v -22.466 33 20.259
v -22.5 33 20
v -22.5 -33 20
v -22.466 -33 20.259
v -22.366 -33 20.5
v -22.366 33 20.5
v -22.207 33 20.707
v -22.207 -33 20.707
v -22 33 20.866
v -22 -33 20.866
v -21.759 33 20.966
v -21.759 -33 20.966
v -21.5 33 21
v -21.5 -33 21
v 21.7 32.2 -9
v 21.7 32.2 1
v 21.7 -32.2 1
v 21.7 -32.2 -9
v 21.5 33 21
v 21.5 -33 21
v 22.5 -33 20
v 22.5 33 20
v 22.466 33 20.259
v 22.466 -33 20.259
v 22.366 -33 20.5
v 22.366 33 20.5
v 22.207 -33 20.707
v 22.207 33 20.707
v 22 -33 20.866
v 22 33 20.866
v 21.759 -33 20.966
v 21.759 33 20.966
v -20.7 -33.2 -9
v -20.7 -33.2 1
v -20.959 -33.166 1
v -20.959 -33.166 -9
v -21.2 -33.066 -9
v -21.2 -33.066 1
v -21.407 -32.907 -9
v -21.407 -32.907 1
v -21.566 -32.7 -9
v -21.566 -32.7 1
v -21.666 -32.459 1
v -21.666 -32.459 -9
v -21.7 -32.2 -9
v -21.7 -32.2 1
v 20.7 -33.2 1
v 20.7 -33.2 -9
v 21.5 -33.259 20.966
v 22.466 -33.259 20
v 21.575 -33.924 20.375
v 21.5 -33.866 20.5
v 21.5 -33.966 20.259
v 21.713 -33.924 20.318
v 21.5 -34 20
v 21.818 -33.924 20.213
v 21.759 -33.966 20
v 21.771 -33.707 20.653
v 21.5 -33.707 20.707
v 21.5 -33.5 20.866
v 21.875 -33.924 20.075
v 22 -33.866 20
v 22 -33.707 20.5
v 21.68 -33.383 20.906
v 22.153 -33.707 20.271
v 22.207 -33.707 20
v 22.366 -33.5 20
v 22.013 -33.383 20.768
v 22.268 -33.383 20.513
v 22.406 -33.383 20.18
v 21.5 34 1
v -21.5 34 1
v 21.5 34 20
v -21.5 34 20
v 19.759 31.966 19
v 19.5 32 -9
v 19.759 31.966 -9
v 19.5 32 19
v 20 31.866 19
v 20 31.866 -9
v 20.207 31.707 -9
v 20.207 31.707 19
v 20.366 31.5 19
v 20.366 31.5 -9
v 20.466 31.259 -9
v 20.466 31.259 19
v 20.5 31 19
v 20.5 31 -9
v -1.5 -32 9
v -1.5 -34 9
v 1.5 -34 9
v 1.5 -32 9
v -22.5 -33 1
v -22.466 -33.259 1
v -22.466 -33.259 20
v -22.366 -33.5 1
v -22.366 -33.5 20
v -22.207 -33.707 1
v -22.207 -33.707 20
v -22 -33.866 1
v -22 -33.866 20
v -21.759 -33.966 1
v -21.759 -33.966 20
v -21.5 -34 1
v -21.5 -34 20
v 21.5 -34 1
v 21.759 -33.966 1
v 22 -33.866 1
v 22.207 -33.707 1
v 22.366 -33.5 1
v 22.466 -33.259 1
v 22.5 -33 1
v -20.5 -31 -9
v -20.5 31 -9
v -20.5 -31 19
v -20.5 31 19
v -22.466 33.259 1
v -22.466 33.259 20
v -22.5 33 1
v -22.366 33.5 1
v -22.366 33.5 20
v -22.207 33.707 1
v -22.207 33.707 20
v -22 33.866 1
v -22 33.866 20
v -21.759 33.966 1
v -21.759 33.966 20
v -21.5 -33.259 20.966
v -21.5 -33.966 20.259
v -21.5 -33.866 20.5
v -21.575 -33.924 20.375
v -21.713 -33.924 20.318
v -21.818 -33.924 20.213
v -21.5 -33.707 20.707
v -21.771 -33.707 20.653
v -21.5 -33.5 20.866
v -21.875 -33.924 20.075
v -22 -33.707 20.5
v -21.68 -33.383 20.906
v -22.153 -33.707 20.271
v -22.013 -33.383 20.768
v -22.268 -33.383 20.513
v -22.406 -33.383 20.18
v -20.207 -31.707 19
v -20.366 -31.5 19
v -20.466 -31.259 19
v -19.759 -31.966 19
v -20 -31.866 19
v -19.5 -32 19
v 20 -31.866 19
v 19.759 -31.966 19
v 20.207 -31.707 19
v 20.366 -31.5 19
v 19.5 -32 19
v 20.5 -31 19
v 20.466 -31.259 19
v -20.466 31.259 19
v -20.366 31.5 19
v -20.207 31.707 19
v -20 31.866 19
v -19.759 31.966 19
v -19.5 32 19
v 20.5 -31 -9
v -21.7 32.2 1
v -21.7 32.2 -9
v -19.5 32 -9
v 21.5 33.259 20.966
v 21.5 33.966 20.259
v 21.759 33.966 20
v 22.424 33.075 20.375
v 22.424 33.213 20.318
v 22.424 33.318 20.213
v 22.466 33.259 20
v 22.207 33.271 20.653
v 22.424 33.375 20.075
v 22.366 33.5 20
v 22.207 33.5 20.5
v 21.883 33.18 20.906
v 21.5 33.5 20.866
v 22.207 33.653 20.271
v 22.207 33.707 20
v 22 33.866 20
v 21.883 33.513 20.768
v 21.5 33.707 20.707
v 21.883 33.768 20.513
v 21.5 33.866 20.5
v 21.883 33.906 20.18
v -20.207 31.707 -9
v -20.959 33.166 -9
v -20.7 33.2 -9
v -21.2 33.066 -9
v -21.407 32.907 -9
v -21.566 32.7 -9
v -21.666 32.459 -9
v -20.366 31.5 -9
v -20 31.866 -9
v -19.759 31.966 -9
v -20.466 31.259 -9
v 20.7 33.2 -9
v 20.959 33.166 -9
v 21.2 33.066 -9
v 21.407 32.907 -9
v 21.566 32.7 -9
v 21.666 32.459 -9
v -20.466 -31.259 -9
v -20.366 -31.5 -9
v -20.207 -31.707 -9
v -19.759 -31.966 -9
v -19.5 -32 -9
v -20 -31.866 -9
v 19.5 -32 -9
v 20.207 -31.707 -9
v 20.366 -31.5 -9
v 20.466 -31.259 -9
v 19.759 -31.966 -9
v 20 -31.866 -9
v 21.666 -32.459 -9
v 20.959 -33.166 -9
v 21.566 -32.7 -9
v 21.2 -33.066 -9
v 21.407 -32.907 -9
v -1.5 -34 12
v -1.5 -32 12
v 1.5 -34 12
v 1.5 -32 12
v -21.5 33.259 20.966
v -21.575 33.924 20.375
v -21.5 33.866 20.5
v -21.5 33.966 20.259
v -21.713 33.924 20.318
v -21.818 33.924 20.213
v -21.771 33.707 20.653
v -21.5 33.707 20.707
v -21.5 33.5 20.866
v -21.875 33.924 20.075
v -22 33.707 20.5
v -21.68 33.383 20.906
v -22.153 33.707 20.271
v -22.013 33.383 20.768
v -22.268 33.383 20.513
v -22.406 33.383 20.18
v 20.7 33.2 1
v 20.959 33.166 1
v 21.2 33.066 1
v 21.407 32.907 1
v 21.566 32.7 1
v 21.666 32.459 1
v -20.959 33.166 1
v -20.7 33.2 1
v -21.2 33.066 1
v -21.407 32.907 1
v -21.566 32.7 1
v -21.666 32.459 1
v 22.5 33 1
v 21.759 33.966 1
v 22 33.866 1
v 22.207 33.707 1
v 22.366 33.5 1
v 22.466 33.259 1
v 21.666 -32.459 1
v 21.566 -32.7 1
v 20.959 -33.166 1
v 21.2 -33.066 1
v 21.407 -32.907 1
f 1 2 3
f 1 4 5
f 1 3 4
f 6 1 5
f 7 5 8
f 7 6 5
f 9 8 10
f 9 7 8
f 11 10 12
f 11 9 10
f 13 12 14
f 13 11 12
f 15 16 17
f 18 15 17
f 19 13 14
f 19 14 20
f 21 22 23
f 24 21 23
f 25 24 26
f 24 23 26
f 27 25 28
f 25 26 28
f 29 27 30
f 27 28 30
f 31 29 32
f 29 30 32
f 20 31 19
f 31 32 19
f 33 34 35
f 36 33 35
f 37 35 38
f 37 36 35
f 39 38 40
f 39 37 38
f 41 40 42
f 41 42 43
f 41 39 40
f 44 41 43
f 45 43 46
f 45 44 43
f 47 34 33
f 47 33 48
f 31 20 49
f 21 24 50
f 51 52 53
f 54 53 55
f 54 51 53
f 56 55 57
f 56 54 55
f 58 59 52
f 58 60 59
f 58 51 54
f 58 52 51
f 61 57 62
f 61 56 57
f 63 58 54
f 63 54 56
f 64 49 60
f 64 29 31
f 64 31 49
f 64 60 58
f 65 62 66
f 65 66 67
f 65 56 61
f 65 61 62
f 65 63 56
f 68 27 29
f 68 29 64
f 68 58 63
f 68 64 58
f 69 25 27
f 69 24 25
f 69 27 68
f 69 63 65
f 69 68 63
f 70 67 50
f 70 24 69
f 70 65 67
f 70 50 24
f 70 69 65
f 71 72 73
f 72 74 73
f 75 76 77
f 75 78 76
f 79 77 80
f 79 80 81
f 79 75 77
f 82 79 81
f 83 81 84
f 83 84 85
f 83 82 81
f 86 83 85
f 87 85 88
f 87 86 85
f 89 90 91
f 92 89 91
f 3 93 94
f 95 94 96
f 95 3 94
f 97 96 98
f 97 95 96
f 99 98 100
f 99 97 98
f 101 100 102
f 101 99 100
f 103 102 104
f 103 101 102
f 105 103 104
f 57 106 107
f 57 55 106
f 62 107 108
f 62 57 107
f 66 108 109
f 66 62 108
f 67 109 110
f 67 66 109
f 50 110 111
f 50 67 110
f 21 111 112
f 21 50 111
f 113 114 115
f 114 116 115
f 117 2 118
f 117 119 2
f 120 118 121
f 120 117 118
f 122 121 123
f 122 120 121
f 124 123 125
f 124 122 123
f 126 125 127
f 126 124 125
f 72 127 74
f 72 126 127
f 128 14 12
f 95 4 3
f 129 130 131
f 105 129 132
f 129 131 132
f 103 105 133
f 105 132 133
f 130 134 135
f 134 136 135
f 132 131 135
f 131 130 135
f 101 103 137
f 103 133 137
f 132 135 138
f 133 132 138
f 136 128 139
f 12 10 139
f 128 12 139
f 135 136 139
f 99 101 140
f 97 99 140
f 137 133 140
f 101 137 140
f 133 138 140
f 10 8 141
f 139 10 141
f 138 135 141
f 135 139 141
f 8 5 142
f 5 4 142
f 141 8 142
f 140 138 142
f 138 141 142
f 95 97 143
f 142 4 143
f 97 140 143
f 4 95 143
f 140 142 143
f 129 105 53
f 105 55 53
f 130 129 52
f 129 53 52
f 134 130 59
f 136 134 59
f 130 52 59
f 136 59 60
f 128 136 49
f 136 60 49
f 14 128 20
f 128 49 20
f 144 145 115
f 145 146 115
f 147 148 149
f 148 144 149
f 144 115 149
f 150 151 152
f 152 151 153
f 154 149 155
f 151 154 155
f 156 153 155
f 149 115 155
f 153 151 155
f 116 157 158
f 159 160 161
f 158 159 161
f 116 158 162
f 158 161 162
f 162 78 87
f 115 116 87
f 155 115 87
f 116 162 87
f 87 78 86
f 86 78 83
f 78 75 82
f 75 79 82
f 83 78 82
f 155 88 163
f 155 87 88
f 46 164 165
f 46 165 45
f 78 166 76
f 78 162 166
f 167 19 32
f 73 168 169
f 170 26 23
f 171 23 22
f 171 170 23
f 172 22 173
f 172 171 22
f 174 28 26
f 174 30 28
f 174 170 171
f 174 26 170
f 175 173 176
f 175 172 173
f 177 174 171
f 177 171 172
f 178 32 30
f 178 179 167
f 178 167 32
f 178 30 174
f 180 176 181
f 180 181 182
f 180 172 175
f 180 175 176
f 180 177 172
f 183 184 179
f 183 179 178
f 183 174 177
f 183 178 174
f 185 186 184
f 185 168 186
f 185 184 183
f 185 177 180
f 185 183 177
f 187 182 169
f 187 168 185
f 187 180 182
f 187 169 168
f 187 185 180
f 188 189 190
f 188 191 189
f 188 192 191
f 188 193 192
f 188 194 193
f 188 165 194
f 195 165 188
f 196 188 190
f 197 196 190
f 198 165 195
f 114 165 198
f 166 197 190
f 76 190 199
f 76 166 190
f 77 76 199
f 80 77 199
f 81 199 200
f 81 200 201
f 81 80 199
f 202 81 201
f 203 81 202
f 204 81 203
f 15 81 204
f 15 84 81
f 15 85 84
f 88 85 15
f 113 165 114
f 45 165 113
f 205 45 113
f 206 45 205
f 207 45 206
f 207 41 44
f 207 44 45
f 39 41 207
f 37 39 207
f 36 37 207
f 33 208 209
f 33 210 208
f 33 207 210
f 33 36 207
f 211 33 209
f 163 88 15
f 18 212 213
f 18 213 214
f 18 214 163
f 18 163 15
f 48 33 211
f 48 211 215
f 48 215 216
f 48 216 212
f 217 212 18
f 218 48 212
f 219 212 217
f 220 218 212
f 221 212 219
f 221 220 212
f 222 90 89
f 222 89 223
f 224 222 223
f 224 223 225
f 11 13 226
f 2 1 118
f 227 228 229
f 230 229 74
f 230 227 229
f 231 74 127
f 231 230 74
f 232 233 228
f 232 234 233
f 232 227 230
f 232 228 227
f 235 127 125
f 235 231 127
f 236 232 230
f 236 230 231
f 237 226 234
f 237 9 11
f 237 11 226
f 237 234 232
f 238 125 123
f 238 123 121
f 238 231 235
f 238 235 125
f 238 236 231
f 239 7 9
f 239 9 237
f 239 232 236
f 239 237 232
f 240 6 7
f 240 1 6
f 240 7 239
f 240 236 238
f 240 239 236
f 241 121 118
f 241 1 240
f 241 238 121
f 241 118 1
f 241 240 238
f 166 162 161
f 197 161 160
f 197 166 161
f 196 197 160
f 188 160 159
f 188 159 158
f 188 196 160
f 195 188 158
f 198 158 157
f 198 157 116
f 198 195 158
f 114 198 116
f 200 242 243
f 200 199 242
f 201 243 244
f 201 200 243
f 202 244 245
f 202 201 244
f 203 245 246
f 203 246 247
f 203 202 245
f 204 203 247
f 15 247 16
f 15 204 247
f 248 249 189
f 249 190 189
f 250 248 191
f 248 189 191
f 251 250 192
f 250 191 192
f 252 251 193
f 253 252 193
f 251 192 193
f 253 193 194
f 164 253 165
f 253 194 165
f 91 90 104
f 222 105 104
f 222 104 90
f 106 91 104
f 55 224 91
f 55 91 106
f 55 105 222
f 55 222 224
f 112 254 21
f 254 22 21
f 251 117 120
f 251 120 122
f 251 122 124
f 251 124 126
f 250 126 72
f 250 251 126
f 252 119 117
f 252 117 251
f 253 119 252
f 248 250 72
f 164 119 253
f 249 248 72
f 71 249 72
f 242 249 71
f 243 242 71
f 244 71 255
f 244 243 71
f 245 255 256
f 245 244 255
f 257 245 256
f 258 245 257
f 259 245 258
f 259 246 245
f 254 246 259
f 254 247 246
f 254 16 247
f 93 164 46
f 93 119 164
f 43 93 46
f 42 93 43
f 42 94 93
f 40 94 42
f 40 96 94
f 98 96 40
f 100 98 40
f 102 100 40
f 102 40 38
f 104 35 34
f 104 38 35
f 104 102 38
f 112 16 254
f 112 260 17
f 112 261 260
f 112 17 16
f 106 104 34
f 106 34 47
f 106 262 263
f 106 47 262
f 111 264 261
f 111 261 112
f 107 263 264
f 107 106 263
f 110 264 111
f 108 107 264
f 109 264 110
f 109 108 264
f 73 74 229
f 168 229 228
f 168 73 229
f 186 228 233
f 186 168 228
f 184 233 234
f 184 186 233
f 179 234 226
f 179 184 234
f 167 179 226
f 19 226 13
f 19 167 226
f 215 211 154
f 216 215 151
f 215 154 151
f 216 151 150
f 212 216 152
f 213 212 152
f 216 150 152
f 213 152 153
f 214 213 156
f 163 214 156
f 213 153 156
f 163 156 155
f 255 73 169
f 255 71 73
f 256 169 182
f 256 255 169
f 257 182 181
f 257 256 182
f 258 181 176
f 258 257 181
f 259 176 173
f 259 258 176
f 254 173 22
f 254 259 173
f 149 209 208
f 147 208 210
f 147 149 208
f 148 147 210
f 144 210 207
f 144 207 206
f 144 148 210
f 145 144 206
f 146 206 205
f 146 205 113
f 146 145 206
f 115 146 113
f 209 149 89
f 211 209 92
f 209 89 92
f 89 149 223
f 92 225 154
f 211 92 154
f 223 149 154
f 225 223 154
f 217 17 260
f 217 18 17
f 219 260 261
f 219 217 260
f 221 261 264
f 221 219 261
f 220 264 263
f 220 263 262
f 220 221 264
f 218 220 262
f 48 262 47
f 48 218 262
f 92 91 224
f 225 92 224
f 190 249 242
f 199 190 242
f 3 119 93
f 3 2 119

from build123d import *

# Parameters (mm, degrees)
SKETCH011_W     = 45
SKETCH011_H     = 68
PAD007_DEPTH    = 2
SKETCH012_W     = 45
SKETCH012_H     = 68
SKETCH012_W_2   = 41
SKETCH012_H_2   = 64
PAD008_DEPTH    = 18
SKETCH013_W     = 43.4
SKETCH013_H     = 66.4
SKETCH013_W_2   = 41
SKETCH013_H_2   = 64
PAD009_DEPTH    = 10
SKETCH014_W     = 3
SKETCH014_H     = 3
POCKET004_DEPTH = 5
FILLET_R        = 1
FILLET002_R     = 1


with BuildPart() as part:
    # Sketch011 → Pad007 (new body)
    with BuildSketch(Plane.XY):
        Rectangle(SKETCH011_W, SKETCH011_H)
    extrude(amount=-PAD007_DEPTH)

    # Sketch012 (on Face6 of Pad007) → Pad008 (join)
    with BuildSketch(Plane(origin=(0, 0, -2), x_dir=(1, 0, 0), z_dir=(0, 0, -1))):
        Rectangle(SKETCH012_W, SKETCH012_H)
        Rectangle(SKETCH012_W_2, SKETCH012_H_2, mode=Mode.SUBTRACT)
    extrude(amount=PAD008_DEPTH)

    # Sketch013 (on Face9 of Pad008) → Pad009 (join)
    with BuildSketch(Plane(origin=(0, 0, -20), x_dir=(1, 0, 0), z_dir=(0, 0, -1))):
        Rectangle(SKETCH013_W, SKETCH013_H)
        Rectangle(SKETCH013_W_2, SKETCH013_H_2, mode=Mode.SUBTRACT)
    extrude(amount=PAD009_DEPTH)

    # Sketch014 (on Face10 of Pad009) → Pocket004 (cut)
    with BuildSketch(Plane.XZ.offset(34)):
        with Locations((0, -10.5)):
            Rectangle(SKETCH014_W, SKETCH014_H)
    extrude(amount=-POCKET004_DEPTH, mode=Mode.SUBTRACT)

    # Fillet
    fillet_edges = [part.edges().sort_by_distance(p)[0] for p in [
        (-22.5, 0, 0),
        (0, 34, 0),
        (22.5, 0, 0),
        (0, -34, 0),
        (-22.5, -34, -11),
        (-22.5, 34, -11),
        (22.5, -34, -11),
        (22.5, 34, -11),
    ]]
    fillet(fillet_edges, radius=FILLET_R)

    # Fillet002
    fillet002_edges = [part.edges().sort_by_distance(p)[0] for p in [
        (-20.5, -32, -25),
        (-21.7, -33.2, -25),
        (21.7, -33.2, -25),
        (20.5, -32, -25),
        (21.7, 33.2, -25),
        (20.5, 32, -25),
        (-21.7, 33.2, -25),
        (-20.5, 32, -25),
    ]]
    fillet(fillet002_edges, radius=FILLET002_R)


with BuildPart() as part_1:
    # Body002 placement: moved
    add(part.part.moved(Location((0, 0, 21))))


solid = part_1.part
